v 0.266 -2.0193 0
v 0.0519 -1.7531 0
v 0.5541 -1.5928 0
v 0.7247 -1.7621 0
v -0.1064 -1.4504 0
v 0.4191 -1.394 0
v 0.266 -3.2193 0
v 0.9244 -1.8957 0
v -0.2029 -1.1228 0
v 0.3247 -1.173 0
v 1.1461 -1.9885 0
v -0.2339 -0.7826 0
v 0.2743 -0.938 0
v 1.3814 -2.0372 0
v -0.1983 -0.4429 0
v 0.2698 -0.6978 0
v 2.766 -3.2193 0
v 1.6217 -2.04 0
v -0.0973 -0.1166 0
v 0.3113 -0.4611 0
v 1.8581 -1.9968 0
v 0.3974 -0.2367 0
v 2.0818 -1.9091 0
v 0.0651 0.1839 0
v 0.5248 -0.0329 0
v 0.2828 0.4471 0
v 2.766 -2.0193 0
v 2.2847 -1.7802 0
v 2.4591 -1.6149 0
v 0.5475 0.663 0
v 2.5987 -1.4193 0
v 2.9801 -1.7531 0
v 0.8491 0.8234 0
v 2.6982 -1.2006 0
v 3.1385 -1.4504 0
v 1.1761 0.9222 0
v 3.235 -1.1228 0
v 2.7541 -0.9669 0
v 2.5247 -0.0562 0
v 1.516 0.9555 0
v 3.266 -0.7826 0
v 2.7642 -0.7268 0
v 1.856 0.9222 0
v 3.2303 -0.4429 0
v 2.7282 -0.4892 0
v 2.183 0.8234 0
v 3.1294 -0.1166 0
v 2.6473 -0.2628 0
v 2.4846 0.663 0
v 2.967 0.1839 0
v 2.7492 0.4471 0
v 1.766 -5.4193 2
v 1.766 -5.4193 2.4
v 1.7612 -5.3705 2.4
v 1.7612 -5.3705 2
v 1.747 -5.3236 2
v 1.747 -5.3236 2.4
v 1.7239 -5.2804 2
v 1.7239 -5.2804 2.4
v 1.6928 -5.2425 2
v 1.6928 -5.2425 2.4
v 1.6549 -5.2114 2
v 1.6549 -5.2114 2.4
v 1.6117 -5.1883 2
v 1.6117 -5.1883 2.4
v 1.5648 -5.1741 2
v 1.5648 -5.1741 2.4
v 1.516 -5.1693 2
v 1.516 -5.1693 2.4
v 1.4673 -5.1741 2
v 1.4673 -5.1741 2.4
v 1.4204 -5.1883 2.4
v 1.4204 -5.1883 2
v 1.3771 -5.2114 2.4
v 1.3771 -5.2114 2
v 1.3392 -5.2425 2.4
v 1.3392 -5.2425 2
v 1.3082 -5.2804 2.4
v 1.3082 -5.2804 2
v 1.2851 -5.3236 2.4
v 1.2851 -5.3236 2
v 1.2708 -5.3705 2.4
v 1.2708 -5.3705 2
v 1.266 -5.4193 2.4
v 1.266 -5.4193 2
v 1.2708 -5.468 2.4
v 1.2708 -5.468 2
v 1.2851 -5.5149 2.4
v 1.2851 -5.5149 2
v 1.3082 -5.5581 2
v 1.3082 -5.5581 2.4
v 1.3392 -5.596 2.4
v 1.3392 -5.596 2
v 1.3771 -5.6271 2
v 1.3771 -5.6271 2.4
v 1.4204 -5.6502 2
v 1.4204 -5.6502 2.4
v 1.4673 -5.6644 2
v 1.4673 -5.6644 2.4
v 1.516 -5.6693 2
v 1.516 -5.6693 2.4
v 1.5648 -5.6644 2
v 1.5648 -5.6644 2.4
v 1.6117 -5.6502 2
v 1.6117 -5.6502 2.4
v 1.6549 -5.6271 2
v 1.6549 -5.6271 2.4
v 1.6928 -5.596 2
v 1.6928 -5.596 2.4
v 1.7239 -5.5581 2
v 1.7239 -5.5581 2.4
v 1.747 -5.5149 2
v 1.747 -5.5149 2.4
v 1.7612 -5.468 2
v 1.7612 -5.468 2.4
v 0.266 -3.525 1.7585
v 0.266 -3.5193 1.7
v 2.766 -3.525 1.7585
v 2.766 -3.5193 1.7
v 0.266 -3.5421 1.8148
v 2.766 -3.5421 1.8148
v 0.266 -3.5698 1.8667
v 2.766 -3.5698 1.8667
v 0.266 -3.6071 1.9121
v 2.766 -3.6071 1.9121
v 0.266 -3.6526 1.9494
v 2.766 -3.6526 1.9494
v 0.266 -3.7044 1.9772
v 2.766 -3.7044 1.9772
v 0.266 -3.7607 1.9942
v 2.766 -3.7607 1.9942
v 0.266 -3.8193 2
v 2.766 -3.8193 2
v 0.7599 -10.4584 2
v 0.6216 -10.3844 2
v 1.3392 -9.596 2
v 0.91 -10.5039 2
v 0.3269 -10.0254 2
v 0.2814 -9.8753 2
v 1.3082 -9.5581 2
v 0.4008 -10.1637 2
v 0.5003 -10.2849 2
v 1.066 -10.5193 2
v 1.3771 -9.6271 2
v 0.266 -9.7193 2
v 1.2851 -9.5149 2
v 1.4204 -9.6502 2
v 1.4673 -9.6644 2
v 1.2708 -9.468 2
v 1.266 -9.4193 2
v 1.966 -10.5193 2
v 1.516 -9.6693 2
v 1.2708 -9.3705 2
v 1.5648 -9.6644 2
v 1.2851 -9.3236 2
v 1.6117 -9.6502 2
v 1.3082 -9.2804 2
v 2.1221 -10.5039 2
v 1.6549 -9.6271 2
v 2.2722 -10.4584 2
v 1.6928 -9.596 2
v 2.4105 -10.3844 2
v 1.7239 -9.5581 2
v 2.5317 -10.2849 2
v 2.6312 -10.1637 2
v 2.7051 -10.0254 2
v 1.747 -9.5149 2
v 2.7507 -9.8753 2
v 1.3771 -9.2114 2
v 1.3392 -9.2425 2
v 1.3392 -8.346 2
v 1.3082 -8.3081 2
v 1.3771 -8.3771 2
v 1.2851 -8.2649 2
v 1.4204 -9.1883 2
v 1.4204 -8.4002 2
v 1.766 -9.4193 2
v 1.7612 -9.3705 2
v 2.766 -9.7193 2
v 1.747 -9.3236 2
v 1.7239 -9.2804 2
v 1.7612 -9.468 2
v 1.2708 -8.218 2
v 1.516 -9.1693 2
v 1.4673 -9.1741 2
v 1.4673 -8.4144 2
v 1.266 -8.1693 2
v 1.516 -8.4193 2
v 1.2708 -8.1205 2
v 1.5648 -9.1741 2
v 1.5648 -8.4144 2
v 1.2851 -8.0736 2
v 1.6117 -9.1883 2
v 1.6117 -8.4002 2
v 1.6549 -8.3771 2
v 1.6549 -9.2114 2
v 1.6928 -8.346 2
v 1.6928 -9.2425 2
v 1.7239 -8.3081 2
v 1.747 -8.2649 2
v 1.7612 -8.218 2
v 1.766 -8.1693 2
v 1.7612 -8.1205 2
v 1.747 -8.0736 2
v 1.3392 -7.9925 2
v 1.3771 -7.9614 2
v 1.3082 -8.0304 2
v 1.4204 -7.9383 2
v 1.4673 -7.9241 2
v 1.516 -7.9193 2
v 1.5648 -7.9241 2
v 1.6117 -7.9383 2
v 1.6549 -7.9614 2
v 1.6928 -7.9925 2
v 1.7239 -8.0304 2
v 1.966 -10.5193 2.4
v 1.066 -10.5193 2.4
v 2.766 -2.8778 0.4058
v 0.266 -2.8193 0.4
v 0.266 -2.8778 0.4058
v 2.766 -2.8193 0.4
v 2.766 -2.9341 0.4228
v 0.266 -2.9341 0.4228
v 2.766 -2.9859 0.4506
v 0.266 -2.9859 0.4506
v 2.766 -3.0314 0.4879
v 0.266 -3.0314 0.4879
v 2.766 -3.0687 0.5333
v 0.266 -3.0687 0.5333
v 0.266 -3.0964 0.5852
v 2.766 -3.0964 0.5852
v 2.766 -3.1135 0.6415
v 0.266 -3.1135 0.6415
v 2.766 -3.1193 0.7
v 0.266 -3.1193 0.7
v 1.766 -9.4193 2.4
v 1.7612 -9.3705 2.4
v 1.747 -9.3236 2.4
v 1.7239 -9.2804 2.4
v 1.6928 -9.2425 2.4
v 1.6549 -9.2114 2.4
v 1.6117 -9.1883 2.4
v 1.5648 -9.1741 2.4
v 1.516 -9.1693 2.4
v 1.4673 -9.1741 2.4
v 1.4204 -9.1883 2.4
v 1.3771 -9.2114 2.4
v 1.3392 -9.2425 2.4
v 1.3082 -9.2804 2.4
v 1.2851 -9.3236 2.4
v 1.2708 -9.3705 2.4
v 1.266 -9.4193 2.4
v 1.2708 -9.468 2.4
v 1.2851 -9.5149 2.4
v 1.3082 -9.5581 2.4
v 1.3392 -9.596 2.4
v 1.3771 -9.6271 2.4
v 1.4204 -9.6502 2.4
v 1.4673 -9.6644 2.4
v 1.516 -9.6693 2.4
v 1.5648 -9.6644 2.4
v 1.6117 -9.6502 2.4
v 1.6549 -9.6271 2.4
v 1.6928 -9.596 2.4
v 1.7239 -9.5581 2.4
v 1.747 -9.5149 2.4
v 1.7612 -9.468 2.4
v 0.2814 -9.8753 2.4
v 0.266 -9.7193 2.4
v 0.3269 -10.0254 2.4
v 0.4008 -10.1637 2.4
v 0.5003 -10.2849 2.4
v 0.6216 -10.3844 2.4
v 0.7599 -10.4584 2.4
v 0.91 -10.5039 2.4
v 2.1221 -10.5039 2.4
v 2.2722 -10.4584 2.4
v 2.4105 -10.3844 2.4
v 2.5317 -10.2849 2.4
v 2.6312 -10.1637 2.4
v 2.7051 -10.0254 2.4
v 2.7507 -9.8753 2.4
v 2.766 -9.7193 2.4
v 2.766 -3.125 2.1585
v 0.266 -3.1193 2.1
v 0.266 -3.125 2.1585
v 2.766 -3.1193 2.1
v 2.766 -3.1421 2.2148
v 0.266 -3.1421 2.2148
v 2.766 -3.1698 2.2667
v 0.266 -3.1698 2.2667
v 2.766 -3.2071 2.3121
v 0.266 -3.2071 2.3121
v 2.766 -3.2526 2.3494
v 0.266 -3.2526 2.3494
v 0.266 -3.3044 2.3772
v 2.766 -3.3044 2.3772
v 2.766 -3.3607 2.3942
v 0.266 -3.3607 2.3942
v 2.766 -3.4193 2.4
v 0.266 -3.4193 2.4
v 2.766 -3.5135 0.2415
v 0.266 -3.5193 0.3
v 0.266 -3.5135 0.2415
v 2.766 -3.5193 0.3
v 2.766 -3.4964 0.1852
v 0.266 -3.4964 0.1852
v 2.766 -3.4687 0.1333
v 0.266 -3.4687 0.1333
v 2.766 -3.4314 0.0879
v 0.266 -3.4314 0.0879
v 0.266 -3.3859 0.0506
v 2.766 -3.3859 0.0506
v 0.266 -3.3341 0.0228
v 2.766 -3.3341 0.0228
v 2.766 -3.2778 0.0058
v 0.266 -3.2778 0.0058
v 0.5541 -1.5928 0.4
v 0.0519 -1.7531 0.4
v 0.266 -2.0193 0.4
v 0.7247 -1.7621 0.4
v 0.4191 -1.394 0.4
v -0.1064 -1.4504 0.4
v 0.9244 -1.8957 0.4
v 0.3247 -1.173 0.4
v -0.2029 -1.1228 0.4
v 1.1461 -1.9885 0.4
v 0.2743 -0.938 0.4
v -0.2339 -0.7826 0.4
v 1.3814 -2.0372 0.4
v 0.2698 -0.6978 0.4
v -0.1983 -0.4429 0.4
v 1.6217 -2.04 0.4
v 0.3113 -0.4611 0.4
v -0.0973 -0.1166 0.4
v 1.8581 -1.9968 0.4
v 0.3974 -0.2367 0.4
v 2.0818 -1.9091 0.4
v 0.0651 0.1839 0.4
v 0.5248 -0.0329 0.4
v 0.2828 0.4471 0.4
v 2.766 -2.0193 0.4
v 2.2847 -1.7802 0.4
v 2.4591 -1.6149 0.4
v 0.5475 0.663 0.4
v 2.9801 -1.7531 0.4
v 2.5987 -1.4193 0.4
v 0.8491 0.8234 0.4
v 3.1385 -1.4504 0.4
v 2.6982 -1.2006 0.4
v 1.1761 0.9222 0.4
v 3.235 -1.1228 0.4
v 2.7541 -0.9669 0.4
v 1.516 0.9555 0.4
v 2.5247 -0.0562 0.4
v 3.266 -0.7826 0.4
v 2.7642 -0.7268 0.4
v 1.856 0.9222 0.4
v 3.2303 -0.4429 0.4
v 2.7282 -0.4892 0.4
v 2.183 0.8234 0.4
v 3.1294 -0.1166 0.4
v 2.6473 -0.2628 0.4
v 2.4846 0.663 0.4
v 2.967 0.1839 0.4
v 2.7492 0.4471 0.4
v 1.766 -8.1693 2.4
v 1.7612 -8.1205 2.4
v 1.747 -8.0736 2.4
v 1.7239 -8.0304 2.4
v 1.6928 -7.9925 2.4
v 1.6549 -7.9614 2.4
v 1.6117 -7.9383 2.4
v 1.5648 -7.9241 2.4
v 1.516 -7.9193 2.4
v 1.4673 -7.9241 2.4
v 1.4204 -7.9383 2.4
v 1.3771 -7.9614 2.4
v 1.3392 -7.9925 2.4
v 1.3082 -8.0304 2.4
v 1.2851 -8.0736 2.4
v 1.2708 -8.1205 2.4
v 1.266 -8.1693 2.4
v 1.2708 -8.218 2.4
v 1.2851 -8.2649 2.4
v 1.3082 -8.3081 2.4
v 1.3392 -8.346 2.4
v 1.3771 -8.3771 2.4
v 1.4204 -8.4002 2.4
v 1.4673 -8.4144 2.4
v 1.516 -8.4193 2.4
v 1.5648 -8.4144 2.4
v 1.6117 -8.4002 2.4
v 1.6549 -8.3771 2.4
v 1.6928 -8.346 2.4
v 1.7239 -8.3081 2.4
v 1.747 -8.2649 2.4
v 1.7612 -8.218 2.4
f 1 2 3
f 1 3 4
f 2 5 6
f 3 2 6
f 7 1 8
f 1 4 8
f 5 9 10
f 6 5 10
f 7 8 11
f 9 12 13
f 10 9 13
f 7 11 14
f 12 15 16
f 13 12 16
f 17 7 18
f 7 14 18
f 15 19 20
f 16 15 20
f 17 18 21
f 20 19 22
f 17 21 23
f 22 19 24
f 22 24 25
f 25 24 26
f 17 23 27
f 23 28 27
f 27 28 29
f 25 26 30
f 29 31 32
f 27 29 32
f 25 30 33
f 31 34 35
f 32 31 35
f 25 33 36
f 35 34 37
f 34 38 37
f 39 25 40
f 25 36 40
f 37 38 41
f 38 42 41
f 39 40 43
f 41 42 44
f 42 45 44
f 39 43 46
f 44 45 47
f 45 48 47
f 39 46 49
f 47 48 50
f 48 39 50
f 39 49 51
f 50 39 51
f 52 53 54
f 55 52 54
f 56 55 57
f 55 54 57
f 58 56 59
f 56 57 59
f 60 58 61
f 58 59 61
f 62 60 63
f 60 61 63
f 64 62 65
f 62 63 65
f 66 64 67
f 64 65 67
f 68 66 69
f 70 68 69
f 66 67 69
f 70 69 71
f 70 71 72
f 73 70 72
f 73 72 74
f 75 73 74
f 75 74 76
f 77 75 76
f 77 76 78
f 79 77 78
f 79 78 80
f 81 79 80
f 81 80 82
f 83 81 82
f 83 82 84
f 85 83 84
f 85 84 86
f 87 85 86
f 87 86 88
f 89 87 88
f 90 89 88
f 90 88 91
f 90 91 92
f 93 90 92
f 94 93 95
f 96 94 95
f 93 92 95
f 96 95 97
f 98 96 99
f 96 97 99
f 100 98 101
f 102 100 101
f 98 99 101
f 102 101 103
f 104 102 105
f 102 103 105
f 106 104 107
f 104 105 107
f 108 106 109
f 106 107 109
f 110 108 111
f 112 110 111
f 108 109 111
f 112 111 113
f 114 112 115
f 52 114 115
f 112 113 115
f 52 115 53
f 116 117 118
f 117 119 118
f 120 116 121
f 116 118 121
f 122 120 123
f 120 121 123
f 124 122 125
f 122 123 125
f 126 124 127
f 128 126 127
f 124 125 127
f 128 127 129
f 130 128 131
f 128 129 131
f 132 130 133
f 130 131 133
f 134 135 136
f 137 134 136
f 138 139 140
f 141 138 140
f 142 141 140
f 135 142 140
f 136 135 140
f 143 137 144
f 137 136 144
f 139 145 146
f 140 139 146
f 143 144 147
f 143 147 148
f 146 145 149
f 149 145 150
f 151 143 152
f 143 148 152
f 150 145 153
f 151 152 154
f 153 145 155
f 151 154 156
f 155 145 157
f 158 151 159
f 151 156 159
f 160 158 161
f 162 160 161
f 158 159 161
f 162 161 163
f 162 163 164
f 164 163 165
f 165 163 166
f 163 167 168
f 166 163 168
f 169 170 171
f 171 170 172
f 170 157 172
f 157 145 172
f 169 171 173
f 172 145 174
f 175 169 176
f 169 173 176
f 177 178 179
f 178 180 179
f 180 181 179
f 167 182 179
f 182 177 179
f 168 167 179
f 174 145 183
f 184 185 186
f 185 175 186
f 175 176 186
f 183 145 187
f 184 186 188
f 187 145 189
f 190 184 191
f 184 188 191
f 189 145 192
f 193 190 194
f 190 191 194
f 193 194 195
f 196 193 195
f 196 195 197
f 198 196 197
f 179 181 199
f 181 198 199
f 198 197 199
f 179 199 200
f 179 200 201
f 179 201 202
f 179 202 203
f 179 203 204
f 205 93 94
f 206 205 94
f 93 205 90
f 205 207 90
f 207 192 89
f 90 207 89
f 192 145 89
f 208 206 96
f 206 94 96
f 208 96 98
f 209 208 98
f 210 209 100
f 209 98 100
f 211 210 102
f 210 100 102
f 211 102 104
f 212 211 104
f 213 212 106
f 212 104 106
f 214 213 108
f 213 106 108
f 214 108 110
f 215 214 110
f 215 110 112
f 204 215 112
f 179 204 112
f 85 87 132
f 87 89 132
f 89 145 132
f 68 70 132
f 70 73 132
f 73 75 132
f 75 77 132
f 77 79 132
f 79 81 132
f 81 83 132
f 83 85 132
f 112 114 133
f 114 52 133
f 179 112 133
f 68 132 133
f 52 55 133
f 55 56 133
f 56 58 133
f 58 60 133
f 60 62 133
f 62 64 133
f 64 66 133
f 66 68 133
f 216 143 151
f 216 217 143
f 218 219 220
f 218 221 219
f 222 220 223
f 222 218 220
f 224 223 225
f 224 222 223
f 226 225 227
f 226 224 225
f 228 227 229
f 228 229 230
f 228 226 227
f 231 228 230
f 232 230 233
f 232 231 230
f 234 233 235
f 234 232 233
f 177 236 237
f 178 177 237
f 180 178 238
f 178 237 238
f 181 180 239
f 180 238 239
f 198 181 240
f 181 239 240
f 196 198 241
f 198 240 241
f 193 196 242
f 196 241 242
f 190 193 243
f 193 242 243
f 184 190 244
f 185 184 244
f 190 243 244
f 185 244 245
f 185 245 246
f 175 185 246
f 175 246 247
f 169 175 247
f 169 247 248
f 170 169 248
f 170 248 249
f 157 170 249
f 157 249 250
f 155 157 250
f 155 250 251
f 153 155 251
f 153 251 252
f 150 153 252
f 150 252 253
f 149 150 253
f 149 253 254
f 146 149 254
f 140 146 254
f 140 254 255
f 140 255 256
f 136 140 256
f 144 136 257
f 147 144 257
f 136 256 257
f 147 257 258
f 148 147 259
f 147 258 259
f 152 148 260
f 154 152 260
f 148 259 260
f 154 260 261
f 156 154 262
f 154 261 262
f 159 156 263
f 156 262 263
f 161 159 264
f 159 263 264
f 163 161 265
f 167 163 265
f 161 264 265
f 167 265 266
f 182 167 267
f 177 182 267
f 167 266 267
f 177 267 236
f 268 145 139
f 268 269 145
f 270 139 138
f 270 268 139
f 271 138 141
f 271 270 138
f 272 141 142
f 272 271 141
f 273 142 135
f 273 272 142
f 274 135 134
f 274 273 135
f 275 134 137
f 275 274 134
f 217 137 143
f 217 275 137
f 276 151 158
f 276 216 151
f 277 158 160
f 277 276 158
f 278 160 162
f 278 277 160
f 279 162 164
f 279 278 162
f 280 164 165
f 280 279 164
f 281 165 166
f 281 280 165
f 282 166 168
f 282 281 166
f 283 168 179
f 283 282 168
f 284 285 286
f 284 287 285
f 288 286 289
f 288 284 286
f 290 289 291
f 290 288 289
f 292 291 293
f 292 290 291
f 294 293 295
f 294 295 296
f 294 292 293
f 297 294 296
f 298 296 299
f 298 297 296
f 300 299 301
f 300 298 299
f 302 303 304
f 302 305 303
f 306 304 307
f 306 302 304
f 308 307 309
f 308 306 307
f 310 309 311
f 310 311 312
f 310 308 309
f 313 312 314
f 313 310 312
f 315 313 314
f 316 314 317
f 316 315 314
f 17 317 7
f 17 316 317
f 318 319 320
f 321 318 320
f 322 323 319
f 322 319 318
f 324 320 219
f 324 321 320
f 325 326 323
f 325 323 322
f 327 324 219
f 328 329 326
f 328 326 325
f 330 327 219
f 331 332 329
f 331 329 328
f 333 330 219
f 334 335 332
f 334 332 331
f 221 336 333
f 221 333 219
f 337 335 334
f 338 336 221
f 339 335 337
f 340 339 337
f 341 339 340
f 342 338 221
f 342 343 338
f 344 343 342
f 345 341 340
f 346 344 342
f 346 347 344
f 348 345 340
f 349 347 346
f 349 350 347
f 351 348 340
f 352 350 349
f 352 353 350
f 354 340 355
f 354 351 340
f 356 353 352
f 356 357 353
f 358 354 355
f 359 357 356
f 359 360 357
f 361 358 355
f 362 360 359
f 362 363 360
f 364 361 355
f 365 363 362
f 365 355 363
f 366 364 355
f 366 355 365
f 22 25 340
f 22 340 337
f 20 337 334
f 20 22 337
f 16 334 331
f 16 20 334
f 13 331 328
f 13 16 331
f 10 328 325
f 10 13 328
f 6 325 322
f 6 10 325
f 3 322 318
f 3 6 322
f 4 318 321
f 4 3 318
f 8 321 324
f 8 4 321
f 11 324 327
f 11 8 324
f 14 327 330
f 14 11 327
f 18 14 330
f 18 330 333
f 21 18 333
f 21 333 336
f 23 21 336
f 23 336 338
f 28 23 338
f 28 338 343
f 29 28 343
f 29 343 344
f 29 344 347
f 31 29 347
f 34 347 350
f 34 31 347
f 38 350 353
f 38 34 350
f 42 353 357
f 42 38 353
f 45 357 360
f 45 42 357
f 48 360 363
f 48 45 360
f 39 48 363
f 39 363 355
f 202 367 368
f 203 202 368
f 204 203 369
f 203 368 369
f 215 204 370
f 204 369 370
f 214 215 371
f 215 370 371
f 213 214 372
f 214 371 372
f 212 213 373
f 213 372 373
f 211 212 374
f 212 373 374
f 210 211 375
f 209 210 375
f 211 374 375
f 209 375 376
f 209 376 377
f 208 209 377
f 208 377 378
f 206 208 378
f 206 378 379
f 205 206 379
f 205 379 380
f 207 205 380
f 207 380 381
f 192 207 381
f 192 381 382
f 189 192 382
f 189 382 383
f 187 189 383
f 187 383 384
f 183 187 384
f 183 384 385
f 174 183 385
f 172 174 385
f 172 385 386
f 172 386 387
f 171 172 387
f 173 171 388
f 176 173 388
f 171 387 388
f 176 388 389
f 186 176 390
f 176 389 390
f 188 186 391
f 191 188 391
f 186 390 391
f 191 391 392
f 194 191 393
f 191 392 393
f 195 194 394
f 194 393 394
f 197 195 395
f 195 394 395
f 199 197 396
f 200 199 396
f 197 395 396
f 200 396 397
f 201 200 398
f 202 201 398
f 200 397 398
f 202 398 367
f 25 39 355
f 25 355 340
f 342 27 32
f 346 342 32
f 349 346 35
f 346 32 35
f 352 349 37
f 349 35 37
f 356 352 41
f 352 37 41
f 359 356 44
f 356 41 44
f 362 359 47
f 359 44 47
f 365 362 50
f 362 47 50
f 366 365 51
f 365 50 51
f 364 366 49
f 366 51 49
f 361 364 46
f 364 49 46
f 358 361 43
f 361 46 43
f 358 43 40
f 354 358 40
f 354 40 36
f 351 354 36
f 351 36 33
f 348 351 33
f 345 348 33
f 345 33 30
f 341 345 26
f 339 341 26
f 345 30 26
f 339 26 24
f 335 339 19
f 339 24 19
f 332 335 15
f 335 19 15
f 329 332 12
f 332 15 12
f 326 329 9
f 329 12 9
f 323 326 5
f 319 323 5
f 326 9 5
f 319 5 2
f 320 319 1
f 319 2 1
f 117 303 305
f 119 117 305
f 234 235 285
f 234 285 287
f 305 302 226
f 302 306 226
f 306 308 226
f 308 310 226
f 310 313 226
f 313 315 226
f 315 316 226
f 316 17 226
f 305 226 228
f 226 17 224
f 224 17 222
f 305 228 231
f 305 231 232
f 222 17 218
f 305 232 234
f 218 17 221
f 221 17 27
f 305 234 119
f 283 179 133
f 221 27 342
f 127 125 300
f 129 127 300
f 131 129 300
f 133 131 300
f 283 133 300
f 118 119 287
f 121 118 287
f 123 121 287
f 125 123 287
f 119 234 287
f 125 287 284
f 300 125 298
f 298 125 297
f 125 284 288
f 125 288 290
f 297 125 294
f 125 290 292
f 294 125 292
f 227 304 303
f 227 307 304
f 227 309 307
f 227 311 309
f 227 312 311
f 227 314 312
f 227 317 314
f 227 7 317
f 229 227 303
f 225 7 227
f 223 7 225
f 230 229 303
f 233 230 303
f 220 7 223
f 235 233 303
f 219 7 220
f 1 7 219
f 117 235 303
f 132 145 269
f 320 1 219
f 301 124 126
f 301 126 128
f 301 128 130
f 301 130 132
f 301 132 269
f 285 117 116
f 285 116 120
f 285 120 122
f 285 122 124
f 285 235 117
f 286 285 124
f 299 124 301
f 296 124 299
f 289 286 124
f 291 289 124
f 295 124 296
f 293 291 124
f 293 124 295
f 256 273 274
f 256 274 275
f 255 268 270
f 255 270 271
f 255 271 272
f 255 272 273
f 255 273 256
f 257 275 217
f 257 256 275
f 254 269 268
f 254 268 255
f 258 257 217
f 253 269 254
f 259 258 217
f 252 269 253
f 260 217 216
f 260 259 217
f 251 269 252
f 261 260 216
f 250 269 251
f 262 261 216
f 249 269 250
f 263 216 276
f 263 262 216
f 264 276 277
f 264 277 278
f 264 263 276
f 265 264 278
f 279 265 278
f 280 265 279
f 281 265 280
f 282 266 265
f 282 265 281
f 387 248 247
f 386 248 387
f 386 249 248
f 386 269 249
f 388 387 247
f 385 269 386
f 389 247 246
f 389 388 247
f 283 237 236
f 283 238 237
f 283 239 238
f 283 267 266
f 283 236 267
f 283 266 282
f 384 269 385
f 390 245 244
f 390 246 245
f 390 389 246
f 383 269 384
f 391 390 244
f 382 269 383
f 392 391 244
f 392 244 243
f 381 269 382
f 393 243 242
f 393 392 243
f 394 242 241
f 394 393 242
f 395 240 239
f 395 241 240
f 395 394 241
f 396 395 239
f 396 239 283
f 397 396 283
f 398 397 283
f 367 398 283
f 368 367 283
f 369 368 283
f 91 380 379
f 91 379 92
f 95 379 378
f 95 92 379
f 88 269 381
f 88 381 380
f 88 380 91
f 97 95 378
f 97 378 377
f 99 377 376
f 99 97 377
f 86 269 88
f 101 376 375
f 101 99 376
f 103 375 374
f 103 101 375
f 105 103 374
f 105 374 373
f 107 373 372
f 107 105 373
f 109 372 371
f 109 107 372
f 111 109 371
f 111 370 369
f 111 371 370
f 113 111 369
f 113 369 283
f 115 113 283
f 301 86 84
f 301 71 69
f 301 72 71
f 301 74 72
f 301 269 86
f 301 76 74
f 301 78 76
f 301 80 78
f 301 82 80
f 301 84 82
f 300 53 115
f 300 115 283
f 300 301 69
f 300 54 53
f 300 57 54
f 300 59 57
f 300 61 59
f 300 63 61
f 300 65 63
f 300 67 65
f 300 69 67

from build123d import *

# Parameters (mm, degrees)
BOSS_EXTRUDE1_DEPTH = 0.4
SKETCH2_W           = 2.5
SKETCH2_H           = 0.4
BOSS_EXTRUDE2_DEPTH = 2
SKETCH3_W           = 2.5
SKETCH3_H           = 0.4
BOSS_EXTRUDE3_DEPTH = 7
FILLET1_R           = 0.3
FILLET2_R           = 0.8
SKETCH4_R           = 0.25
CUT_EXTRUDE1_DEPTH  = 4


with BuildPart() as part:
    # Sketch1 → Boss-Extrude1 (new body)
    with BuildSketch(Plane.XY):
        with BuildLine():
            Line((0.266025337, -2.019252852), (0.266025337, -3.519252852))
            Line((0.266025337, -3.519252852), (2.766025337, -3.519252852))
            Line((2.766025337, -3.519252852), (2.766025337, -2.019252852))
            ThreePointArc((2.766025337, -2.019252852), (1.516025337, 0.955492019), (0.266025337, -2.019252852))
        make_face()
        with BuildLine():
            Line((2.524676695, -0.056183906), (0.524811845, -0.032933419))
            ThreePointArc((0.524811845, -0.032933419), (1.501493783, -2.044423511), (2.524676695, -0.056183906))
        make_face(mode=Mode.SUBTRACT)
    extrude(amount=BOSS_EXTRUDE1_DEPTH)

    # Sketch2 → Boss-Extrude2 (add)
    with BuildSketch(Plane.XY.offset(0.4)):
        with Locations((1.516025337, -3.319252852)):
            Rectangle(SKETCH2_W, SKETCH2_H)
    extrude(amount=BOSS_EXTRUDE2_DEPTH)

    # Sketch3 → Boss-Extrude3 (add)
    with BuildSketch(Plane.XZ.offset(3.519252852)):
        with Locations((1.516025337, 2.2)):
            Rectangle(SKETCH3_W, SKETCH3_H)
    extrude(amount=BOSS_EXTRUDE3_DEPTH)

    # Fillet1
    fillet1_edges = [part.edges().sort_by_distance(p)[0] for p in [
        (1.516025337, -3.119252852, 0.4),
        (1.516025337, -3.119252852, 2.4),
        (1.516025337, -3.519252852, 2),
        (1.516025337, -3.519252852, 0),
    ]]
    fillet(fillet1_edges, radius=FILLET1_R)

    # Fillet2
    fillet2_edges = [part.edges().sort_by_distance(p)[0] for p in [
        (0.266025337, -10.519252852, 2.2),
        (2.766025337, -10.519252852, 2.2),
    ]]
    fillet(fillet2_edges, radius=FILLET2_R)

    # Sketch4 → Cut-Extrude1 (cut)
    with BuildSketch(Plane.XY.offset(2.4)):
        with Locations((1.516025337, -5.419252852)):
            Circle(SKETCH4_R)
        with Locations((1.516025337, -9.419252852)):
            Circle(SKETCH4_R)
        with Locations((1.516025337, -8.169252852)):
            Circle(SKETCH4_R)
    extrude(amount=-CUT_EXTRUDE1_DEPTH, mode=Mode.SUBTRACT)


solid = part.part
